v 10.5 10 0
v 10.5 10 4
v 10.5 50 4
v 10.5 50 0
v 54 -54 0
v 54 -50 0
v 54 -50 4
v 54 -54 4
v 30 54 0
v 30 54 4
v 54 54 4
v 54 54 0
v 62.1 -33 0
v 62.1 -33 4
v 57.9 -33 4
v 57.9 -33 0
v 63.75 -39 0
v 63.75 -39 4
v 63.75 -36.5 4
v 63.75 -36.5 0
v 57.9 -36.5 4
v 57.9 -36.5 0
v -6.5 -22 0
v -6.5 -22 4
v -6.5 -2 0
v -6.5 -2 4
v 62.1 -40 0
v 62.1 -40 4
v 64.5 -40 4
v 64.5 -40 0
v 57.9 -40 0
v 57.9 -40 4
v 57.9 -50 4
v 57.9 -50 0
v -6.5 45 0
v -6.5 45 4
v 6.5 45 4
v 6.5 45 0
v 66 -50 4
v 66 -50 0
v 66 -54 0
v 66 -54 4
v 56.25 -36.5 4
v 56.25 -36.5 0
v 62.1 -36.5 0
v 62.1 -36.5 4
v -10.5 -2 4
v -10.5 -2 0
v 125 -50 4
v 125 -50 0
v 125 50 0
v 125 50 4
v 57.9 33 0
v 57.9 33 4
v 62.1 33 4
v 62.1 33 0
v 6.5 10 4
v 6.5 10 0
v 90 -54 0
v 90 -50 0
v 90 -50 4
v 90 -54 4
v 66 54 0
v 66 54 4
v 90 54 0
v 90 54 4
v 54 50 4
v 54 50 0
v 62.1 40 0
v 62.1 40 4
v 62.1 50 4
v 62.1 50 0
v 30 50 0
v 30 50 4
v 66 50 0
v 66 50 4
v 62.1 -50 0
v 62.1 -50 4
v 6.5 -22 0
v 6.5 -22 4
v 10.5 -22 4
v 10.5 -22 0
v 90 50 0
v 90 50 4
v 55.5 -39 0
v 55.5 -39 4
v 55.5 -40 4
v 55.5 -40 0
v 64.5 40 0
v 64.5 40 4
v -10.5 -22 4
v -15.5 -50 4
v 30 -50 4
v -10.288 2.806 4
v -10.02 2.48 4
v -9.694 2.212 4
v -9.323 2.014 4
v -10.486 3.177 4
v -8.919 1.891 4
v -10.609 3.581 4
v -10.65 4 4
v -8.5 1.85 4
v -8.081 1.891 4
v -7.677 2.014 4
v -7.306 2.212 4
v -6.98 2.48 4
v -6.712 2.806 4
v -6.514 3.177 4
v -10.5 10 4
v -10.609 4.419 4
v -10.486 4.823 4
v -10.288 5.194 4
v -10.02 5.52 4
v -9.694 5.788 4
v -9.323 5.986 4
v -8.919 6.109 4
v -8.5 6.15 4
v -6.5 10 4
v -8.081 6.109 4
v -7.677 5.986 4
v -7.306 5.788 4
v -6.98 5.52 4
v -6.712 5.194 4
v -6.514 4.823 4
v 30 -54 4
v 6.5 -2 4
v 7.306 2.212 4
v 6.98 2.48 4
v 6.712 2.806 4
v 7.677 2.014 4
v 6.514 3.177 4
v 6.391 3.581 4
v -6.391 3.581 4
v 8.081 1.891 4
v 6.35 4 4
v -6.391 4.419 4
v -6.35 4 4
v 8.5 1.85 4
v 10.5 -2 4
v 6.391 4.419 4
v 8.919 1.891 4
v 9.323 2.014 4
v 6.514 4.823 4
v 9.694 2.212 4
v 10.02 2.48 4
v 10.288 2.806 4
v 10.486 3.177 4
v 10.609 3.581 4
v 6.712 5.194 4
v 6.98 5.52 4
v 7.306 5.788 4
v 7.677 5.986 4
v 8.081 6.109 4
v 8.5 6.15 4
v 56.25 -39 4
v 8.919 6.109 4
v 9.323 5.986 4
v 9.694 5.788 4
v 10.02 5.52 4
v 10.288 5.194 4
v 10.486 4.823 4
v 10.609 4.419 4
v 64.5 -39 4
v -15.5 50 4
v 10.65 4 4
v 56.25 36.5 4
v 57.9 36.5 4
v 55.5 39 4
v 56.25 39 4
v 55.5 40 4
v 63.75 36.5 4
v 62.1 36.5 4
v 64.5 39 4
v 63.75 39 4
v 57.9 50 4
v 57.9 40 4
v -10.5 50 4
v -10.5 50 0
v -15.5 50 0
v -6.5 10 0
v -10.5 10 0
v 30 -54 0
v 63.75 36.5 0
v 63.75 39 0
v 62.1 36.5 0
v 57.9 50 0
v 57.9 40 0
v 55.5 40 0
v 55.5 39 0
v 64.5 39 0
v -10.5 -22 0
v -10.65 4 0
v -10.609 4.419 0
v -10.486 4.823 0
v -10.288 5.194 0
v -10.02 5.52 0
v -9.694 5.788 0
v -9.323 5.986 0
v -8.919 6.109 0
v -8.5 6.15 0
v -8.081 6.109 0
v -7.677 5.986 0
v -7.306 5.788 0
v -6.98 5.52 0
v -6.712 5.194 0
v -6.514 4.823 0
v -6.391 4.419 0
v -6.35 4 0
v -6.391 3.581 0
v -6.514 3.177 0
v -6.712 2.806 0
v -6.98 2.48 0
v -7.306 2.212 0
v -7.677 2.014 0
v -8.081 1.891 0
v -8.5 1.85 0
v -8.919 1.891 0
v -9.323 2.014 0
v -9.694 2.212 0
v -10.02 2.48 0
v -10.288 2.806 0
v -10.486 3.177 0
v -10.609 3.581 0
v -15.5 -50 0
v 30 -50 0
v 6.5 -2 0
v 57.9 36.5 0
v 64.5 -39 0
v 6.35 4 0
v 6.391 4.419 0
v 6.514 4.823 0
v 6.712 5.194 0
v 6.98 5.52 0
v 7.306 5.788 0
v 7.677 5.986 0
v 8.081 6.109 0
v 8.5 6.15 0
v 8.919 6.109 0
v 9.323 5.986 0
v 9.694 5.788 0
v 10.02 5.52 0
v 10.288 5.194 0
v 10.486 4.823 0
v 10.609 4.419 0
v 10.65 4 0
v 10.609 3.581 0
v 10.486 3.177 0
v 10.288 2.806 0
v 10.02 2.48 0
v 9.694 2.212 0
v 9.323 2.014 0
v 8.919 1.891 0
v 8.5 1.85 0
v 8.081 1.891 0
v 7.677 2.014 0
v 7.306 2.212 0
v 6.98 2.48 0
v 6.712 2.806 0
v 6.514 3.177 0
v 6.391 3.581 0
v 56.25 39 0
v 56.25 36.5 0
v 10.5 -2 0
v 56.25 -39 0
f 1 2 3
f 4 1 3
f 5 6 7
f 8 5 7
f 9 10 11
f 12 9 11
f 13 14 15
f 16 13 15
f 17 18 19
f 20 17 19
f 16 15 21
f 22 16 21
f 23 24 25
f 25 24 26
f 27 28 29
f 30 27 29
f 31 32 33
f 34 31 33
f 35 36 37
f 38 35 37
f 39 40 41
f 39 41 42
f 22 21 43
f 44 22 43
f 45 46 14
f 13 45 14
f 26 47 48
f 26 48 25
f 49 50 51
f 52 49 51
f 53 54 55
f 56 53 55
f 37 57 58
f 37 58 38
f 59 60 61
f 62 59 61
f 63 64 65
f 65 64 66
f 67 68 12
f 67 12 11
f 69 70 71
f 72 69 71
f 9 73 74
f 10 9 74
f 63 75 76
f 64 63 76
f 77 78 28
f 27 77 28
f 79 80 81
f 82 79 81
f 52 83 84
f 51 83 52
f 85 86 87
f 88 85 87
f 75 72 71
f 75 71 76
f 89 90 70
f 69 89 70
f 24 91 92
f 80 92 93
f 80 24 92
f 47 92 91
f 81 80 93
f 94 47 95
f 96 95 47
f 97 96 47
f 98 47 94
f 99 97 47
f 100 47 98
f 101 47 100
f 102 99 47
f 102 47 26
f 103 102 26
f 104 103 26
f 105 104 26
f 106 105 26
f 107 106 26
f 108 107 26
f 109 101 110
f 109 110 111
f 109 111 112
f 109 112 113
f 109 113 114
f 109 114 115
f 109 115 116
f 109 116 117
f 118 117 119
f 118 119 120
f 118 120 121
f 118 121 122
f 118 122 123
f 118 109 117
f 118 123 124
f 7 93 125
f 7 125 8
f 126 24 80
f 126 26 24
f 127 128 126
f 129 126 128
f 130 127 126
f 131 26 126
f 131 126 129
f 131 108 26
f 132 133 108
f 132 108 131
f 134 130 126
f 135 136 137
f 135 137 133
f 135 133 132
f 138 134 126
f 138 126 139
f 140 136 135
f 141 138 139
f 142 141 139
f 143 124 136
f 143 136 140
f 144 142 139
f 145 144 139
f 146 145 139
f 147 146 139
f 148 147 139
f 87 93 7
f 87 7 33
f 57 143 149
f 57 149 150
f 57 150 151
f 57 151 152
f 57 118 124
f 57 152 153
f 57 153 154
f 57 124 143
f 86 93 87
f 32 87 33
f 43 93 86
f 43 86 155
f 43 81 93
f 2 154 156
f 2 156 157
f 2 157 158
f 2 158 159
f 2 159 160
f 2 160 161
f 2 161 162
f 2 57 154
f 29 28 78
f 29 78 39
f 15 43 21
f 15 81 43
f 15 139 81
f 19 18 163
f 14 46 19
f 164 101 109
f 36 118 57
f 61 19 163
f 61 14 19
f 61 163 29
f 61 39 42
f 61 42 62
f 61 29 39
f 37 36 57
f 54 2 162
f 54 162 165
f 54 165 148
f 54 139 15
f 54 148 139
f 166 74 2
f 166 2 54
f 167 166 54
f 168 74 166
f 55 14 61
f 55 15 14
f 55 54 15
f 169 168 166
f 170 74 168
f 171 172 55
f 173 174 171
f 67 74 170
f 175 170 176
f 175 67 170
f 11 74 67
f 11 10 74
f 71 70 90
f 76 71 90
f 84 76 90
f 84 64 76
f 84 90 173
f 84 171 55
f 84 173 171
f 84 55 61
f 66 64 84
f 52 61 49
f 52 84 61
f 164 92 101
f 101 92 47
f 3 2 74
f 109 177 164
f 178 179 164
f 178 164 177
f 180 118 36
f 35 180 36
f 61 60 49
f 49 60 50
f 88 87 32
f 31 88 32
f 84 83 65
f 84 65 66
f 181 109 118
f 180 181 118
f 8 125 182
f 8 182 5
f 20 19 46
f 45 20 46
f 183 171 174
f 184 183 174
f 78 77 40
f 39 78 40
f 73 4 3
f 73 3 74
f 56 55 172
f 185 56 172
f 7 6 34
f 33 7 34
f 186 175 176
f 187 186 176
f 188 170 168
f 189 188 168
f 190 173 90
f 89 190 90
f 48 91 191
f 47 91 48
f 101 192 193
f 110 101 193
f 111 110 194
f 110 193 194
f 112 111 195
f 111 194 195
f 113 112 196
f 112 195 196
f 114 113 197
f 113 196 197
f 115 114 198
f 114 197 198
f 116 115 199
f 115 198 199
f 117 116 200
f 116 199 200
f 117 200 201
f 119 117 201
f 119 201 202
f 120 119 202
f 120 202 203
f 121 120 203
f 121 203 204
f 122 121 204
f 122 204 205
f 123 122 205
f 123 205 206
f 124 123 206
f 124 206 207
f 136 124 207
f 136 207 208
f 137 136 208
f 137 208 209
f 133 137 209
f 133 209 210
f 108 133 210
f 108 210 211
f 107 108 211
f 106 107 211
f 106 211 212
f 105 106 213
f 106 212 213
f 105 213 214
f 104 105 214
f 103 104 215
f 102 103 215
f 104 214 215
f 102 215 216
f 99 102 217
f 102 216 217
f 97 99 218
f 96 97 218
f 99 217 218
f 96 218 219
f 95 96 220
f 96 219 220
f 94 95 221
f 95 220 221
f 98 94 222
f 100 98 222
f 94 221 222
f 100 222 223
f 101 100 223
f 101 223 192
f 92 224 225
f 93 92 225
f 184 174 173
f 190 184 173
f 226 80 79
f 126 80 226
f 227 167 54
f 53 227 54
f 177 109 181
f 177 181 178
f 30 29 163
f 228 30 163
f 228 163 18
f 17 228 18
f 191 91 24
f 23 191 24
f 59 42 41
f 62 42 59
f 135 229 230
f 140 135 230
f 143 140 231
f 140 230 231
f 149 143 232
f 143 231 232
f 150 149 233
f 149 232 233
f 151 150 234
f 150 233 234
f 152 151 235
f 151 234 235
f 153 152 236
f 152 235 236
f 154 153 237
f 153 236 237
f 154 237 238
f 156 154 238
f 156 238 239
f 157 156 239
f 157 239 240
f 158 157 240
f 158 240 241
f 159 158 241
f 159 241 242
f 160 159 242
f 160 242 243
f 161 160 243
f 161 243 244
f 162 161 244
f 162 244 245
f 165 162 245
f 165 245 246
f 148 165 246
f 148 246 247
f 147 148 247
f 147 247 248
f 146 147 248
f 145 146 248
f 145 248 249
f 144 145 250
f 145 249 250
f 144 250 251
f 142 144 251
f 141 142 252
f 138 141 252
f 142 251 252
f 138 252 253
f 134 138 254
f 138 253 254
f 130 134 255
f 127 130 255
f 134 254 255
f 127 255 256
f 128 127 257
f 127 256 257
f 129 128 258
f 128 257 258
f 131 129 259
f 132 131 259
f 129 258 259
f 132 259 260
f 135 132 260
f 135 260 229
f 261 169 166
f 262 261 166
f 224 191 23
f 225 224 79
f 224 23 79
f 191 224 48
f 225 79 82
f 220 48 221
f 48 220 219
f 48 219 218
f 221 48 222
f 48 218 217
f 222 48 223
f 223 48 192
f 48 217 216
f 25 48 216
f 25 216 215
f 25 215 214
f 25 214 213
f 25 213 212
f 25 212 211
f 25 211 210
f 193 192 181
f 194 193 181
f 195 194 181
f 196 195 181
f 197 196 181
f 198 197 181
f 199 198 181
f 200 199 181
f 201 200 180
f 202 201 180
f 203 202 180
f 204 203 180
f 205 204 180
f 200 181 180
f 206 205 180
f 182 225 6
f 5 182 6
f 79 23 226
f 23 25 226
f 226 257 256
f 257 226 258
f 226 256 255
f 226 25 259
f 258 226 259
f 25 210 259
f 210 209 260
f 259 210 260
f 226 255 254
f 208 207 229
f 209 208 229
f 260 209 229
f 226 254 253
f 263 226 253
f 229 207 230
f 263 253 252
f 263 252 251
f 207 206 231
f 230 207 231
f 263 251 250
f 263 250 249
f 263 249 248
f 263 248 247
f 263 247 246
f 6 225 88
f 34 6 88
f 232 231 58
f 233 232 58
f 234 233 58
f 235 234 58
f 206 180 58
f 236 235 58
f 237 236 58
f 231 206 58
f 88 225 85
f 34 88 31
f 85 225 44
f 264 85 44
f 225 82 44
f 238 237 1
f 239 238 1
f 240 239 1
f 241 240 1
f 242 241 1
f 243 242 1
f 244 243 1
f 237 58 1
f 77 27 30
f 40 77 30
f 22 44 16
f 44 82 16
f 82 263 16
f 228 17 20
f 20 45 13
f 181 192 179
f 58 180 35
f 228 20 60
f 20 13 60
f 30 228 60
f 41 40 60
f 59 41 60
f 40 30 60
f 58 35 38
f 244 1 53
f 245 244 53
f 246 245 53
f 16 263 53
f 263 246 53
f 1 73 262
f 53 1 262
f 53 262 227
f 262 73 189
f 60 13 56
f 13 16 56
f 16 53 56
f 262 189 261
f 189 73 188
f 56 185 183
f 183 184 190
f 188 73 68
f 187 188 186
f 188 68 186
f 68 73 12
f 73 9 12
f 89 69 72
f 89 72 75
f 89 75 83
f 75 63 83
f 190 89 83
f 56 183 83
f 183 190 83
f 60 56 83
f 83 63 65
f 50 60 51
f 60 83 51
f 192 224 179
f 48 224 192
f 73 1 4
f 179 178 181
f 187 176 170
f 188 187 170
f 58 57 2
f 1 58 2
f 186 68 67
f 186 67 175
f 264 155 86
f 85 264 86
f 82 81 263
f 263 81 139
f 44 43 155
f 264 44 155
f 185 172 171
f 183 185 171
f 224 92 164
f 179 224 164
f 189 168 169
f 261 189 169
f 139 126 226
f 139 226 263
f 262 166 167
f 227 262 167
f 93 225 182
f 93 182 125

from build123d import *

# Parameters (mm, degrees)
SKETCH1_W                = 250
SKETCH1_H                = 100
BOSS_EXTRUDE1_DEPTH      = 4
SKETCH2_W                = 24
SKETCH2_H                = 4
BOSS_EXTRUDE2_DEPTH      = 4
SKETCH3_W                = 4
SKETCH3_H                = 40
SKETCH3_H_2              = 20
CUT_EXTRUDE1_DEPTH       = 5
M4_CLEARANCE_HOLE1_D     = 4.3
M4_CLEARANCE_HOLE1_DEPTH = 6
M4_CLEARANCE_HOLE1_TIP   = 1.291850331
CUT_EXTRUDE2_DEPTH       = 10
SKETCH7_W                = 13
SKETCH7_H                = 5
CUT_EXTRUDE3_DEPTH       = 10
CUT_EXTRUDE4_DEPTH       = 10


with BuildPart() as part:
    # Sketch1 → Boss-Extrude1 (new body)
    with BuildSketch(Plane.XY):
        Rectangle(SKETCH1_W, SKETCH1_H)
    extrude(amount=BOSS_EXTRUDE1_DEPTH)

    # Sketch2 → Boss-Extrude2 (add)
    with BuildSketch(Plane.XZ.offset(50)):
        with Locations((-78, 2)):
            Rectangle(SKETCH2_W, SKETCH2_H)
        with Locations((-42, 2)):
            Rectangle(SKETCH2_W, SKETCH2_H)
        with Locations((42, 2)):
            Rectangle(SKETCH2_W, SKETCH2_H)
        with Locations((78, 2)):
            Rectangle(SKETCH2_W, SKETCH2_H)
    boss_extrude2 = extrude(amount=BOSS_EXTRUDE2_DEPTH)

    # Sketch3 → Cut-Extrude1 (cut, through all)
    with BuildSketch(Plane.XY.offset(4)):
        with Locations((-8.5, 30)):
            Rectangle(SKETCH3_W, SKETCH3_H)
        with Locations((-8.5, -12)):
            Rectangle(SKETCH3_W, SKETCH3_H_2)
        with Locations((8.5, -12)):
            Rectangle(SKETCH3_W, SKETCH3_H_2)
        with Locations((8.5, 30)):
            Rectangle(SKETCH3_W, SKETCH3_H)
    extrude(amount=-CUT_EXTRUDE1_DEPTH, mode=Mode.SUBTRACT)

    # Mirror1: Boss-Extrude2 across plane
    add(boss_extrude2.mirror(Plane.ZX))

    # M4 Clearance Hole1
    with Locations(Plane.XY.offset(4)):
        with Locations((-8.5, 4), (8.5, 4)):
            Hole(M4_CLEARANCE_HOLE1_D / 2, depth=M4_CLEARANCE_HOLE1_DEPTH)
            with Locations((0, 0, -(M4_CLEARANCE_HOLE1_DEPTH + M4_CLEARANCE_HOLE1_TIP / 2))):  # 118° drill point
                Cone(0, M4_CLEARANCE_HOLE1_D / 2, M4_CLEARANCE_HOLE1_TIP, mode=Mode.SUBTRACT)

    # Sketch6 → Cut-Extrude2 (cut)
    with BuildSketch(Plane.XY.offset(4)):
        Polygon((-62.1, -50), (-57.9, -50), (-57.9, -40), (-55.5, -40), (-55.5, -39), (-56.25, -39), (-56.25, -36.5), (-57.9, -36.5), (-57.9, -33), (-62.1, -33), (-62.1, -36.5), (-63.75, -36.5), (-63.75, -39), (-64.5, -39), (-64.5, -40), (-62.1, -40), align=None)
        Polygon((57.9, -40), (57.9, -50), (62.1, -50), (62.1, -40), (64.5, -40), (64.5, -39), (63.75, -39), (63.75, -36.5), (62.1, -36.5), (62.1, -33), (57.9, -33), (57.9, -36.5), (56.25, -36.5), (56.25, -39), (55.5, -39), (55.5, -40), align=None)
        Polygon((62.1, 40), (62.1, 50), (57.9, 50), (57.9, 40), (55.5, 40), (55.5, 39), (56.25, 39), (56.25, 36.5), (57.9, 36.5), (57.9, 33), (62.1, 33), (62.1, 36.5), (63.75, 36.5), (63.75, 39), (64.5, 39), (64.5, 40), align=None)
        Polygon((-57.9, 50), (-62.1, 50), (-62.1, 40), (-64.5, 40), (-64.5, 39), (-63.75, 39), (-63.75, 36.5), (-62.1, 36.5), (-62.1, 33), (-57.9, 33), (-57.9, 36.5), (-56.25, 36.5), (-56.25, 39), (-55.5, 39), (-55.5, 40), (-57.9, 40), align=None)
    extrude(amount=-CUT_EXTRUDE2_DEPTH, mode=Mode.SUBTRACT)

    # Sketch7 → Cut-Extrude3 (cut)
    with BuildSketch(Plane.XY.offset(4)):
        with Locations((0, 47.5)):
            Rectangle(SKETCH7_W, SKETCH7_H)
    extrude(amount=-CUT_EXTRUDE3_DEPTH, mode=Mode.SUBTRACT)

    # Sketch8 → Cut-Extrude4 (cut)
    with BuildSketch(Plane.XY.offset(4)):
        Polygon((-15.5, 50), (-32.700401322, 262.698056725), (-161.835837728, 81.113354009), (-171.999440278, -88.149719236), (-15.5, -103.395123062), align=None)
    extrude(amount=-CUT_EXTRUDE4_DEPTH, mode=Mode.SUBTRACT)


solid = part.part
